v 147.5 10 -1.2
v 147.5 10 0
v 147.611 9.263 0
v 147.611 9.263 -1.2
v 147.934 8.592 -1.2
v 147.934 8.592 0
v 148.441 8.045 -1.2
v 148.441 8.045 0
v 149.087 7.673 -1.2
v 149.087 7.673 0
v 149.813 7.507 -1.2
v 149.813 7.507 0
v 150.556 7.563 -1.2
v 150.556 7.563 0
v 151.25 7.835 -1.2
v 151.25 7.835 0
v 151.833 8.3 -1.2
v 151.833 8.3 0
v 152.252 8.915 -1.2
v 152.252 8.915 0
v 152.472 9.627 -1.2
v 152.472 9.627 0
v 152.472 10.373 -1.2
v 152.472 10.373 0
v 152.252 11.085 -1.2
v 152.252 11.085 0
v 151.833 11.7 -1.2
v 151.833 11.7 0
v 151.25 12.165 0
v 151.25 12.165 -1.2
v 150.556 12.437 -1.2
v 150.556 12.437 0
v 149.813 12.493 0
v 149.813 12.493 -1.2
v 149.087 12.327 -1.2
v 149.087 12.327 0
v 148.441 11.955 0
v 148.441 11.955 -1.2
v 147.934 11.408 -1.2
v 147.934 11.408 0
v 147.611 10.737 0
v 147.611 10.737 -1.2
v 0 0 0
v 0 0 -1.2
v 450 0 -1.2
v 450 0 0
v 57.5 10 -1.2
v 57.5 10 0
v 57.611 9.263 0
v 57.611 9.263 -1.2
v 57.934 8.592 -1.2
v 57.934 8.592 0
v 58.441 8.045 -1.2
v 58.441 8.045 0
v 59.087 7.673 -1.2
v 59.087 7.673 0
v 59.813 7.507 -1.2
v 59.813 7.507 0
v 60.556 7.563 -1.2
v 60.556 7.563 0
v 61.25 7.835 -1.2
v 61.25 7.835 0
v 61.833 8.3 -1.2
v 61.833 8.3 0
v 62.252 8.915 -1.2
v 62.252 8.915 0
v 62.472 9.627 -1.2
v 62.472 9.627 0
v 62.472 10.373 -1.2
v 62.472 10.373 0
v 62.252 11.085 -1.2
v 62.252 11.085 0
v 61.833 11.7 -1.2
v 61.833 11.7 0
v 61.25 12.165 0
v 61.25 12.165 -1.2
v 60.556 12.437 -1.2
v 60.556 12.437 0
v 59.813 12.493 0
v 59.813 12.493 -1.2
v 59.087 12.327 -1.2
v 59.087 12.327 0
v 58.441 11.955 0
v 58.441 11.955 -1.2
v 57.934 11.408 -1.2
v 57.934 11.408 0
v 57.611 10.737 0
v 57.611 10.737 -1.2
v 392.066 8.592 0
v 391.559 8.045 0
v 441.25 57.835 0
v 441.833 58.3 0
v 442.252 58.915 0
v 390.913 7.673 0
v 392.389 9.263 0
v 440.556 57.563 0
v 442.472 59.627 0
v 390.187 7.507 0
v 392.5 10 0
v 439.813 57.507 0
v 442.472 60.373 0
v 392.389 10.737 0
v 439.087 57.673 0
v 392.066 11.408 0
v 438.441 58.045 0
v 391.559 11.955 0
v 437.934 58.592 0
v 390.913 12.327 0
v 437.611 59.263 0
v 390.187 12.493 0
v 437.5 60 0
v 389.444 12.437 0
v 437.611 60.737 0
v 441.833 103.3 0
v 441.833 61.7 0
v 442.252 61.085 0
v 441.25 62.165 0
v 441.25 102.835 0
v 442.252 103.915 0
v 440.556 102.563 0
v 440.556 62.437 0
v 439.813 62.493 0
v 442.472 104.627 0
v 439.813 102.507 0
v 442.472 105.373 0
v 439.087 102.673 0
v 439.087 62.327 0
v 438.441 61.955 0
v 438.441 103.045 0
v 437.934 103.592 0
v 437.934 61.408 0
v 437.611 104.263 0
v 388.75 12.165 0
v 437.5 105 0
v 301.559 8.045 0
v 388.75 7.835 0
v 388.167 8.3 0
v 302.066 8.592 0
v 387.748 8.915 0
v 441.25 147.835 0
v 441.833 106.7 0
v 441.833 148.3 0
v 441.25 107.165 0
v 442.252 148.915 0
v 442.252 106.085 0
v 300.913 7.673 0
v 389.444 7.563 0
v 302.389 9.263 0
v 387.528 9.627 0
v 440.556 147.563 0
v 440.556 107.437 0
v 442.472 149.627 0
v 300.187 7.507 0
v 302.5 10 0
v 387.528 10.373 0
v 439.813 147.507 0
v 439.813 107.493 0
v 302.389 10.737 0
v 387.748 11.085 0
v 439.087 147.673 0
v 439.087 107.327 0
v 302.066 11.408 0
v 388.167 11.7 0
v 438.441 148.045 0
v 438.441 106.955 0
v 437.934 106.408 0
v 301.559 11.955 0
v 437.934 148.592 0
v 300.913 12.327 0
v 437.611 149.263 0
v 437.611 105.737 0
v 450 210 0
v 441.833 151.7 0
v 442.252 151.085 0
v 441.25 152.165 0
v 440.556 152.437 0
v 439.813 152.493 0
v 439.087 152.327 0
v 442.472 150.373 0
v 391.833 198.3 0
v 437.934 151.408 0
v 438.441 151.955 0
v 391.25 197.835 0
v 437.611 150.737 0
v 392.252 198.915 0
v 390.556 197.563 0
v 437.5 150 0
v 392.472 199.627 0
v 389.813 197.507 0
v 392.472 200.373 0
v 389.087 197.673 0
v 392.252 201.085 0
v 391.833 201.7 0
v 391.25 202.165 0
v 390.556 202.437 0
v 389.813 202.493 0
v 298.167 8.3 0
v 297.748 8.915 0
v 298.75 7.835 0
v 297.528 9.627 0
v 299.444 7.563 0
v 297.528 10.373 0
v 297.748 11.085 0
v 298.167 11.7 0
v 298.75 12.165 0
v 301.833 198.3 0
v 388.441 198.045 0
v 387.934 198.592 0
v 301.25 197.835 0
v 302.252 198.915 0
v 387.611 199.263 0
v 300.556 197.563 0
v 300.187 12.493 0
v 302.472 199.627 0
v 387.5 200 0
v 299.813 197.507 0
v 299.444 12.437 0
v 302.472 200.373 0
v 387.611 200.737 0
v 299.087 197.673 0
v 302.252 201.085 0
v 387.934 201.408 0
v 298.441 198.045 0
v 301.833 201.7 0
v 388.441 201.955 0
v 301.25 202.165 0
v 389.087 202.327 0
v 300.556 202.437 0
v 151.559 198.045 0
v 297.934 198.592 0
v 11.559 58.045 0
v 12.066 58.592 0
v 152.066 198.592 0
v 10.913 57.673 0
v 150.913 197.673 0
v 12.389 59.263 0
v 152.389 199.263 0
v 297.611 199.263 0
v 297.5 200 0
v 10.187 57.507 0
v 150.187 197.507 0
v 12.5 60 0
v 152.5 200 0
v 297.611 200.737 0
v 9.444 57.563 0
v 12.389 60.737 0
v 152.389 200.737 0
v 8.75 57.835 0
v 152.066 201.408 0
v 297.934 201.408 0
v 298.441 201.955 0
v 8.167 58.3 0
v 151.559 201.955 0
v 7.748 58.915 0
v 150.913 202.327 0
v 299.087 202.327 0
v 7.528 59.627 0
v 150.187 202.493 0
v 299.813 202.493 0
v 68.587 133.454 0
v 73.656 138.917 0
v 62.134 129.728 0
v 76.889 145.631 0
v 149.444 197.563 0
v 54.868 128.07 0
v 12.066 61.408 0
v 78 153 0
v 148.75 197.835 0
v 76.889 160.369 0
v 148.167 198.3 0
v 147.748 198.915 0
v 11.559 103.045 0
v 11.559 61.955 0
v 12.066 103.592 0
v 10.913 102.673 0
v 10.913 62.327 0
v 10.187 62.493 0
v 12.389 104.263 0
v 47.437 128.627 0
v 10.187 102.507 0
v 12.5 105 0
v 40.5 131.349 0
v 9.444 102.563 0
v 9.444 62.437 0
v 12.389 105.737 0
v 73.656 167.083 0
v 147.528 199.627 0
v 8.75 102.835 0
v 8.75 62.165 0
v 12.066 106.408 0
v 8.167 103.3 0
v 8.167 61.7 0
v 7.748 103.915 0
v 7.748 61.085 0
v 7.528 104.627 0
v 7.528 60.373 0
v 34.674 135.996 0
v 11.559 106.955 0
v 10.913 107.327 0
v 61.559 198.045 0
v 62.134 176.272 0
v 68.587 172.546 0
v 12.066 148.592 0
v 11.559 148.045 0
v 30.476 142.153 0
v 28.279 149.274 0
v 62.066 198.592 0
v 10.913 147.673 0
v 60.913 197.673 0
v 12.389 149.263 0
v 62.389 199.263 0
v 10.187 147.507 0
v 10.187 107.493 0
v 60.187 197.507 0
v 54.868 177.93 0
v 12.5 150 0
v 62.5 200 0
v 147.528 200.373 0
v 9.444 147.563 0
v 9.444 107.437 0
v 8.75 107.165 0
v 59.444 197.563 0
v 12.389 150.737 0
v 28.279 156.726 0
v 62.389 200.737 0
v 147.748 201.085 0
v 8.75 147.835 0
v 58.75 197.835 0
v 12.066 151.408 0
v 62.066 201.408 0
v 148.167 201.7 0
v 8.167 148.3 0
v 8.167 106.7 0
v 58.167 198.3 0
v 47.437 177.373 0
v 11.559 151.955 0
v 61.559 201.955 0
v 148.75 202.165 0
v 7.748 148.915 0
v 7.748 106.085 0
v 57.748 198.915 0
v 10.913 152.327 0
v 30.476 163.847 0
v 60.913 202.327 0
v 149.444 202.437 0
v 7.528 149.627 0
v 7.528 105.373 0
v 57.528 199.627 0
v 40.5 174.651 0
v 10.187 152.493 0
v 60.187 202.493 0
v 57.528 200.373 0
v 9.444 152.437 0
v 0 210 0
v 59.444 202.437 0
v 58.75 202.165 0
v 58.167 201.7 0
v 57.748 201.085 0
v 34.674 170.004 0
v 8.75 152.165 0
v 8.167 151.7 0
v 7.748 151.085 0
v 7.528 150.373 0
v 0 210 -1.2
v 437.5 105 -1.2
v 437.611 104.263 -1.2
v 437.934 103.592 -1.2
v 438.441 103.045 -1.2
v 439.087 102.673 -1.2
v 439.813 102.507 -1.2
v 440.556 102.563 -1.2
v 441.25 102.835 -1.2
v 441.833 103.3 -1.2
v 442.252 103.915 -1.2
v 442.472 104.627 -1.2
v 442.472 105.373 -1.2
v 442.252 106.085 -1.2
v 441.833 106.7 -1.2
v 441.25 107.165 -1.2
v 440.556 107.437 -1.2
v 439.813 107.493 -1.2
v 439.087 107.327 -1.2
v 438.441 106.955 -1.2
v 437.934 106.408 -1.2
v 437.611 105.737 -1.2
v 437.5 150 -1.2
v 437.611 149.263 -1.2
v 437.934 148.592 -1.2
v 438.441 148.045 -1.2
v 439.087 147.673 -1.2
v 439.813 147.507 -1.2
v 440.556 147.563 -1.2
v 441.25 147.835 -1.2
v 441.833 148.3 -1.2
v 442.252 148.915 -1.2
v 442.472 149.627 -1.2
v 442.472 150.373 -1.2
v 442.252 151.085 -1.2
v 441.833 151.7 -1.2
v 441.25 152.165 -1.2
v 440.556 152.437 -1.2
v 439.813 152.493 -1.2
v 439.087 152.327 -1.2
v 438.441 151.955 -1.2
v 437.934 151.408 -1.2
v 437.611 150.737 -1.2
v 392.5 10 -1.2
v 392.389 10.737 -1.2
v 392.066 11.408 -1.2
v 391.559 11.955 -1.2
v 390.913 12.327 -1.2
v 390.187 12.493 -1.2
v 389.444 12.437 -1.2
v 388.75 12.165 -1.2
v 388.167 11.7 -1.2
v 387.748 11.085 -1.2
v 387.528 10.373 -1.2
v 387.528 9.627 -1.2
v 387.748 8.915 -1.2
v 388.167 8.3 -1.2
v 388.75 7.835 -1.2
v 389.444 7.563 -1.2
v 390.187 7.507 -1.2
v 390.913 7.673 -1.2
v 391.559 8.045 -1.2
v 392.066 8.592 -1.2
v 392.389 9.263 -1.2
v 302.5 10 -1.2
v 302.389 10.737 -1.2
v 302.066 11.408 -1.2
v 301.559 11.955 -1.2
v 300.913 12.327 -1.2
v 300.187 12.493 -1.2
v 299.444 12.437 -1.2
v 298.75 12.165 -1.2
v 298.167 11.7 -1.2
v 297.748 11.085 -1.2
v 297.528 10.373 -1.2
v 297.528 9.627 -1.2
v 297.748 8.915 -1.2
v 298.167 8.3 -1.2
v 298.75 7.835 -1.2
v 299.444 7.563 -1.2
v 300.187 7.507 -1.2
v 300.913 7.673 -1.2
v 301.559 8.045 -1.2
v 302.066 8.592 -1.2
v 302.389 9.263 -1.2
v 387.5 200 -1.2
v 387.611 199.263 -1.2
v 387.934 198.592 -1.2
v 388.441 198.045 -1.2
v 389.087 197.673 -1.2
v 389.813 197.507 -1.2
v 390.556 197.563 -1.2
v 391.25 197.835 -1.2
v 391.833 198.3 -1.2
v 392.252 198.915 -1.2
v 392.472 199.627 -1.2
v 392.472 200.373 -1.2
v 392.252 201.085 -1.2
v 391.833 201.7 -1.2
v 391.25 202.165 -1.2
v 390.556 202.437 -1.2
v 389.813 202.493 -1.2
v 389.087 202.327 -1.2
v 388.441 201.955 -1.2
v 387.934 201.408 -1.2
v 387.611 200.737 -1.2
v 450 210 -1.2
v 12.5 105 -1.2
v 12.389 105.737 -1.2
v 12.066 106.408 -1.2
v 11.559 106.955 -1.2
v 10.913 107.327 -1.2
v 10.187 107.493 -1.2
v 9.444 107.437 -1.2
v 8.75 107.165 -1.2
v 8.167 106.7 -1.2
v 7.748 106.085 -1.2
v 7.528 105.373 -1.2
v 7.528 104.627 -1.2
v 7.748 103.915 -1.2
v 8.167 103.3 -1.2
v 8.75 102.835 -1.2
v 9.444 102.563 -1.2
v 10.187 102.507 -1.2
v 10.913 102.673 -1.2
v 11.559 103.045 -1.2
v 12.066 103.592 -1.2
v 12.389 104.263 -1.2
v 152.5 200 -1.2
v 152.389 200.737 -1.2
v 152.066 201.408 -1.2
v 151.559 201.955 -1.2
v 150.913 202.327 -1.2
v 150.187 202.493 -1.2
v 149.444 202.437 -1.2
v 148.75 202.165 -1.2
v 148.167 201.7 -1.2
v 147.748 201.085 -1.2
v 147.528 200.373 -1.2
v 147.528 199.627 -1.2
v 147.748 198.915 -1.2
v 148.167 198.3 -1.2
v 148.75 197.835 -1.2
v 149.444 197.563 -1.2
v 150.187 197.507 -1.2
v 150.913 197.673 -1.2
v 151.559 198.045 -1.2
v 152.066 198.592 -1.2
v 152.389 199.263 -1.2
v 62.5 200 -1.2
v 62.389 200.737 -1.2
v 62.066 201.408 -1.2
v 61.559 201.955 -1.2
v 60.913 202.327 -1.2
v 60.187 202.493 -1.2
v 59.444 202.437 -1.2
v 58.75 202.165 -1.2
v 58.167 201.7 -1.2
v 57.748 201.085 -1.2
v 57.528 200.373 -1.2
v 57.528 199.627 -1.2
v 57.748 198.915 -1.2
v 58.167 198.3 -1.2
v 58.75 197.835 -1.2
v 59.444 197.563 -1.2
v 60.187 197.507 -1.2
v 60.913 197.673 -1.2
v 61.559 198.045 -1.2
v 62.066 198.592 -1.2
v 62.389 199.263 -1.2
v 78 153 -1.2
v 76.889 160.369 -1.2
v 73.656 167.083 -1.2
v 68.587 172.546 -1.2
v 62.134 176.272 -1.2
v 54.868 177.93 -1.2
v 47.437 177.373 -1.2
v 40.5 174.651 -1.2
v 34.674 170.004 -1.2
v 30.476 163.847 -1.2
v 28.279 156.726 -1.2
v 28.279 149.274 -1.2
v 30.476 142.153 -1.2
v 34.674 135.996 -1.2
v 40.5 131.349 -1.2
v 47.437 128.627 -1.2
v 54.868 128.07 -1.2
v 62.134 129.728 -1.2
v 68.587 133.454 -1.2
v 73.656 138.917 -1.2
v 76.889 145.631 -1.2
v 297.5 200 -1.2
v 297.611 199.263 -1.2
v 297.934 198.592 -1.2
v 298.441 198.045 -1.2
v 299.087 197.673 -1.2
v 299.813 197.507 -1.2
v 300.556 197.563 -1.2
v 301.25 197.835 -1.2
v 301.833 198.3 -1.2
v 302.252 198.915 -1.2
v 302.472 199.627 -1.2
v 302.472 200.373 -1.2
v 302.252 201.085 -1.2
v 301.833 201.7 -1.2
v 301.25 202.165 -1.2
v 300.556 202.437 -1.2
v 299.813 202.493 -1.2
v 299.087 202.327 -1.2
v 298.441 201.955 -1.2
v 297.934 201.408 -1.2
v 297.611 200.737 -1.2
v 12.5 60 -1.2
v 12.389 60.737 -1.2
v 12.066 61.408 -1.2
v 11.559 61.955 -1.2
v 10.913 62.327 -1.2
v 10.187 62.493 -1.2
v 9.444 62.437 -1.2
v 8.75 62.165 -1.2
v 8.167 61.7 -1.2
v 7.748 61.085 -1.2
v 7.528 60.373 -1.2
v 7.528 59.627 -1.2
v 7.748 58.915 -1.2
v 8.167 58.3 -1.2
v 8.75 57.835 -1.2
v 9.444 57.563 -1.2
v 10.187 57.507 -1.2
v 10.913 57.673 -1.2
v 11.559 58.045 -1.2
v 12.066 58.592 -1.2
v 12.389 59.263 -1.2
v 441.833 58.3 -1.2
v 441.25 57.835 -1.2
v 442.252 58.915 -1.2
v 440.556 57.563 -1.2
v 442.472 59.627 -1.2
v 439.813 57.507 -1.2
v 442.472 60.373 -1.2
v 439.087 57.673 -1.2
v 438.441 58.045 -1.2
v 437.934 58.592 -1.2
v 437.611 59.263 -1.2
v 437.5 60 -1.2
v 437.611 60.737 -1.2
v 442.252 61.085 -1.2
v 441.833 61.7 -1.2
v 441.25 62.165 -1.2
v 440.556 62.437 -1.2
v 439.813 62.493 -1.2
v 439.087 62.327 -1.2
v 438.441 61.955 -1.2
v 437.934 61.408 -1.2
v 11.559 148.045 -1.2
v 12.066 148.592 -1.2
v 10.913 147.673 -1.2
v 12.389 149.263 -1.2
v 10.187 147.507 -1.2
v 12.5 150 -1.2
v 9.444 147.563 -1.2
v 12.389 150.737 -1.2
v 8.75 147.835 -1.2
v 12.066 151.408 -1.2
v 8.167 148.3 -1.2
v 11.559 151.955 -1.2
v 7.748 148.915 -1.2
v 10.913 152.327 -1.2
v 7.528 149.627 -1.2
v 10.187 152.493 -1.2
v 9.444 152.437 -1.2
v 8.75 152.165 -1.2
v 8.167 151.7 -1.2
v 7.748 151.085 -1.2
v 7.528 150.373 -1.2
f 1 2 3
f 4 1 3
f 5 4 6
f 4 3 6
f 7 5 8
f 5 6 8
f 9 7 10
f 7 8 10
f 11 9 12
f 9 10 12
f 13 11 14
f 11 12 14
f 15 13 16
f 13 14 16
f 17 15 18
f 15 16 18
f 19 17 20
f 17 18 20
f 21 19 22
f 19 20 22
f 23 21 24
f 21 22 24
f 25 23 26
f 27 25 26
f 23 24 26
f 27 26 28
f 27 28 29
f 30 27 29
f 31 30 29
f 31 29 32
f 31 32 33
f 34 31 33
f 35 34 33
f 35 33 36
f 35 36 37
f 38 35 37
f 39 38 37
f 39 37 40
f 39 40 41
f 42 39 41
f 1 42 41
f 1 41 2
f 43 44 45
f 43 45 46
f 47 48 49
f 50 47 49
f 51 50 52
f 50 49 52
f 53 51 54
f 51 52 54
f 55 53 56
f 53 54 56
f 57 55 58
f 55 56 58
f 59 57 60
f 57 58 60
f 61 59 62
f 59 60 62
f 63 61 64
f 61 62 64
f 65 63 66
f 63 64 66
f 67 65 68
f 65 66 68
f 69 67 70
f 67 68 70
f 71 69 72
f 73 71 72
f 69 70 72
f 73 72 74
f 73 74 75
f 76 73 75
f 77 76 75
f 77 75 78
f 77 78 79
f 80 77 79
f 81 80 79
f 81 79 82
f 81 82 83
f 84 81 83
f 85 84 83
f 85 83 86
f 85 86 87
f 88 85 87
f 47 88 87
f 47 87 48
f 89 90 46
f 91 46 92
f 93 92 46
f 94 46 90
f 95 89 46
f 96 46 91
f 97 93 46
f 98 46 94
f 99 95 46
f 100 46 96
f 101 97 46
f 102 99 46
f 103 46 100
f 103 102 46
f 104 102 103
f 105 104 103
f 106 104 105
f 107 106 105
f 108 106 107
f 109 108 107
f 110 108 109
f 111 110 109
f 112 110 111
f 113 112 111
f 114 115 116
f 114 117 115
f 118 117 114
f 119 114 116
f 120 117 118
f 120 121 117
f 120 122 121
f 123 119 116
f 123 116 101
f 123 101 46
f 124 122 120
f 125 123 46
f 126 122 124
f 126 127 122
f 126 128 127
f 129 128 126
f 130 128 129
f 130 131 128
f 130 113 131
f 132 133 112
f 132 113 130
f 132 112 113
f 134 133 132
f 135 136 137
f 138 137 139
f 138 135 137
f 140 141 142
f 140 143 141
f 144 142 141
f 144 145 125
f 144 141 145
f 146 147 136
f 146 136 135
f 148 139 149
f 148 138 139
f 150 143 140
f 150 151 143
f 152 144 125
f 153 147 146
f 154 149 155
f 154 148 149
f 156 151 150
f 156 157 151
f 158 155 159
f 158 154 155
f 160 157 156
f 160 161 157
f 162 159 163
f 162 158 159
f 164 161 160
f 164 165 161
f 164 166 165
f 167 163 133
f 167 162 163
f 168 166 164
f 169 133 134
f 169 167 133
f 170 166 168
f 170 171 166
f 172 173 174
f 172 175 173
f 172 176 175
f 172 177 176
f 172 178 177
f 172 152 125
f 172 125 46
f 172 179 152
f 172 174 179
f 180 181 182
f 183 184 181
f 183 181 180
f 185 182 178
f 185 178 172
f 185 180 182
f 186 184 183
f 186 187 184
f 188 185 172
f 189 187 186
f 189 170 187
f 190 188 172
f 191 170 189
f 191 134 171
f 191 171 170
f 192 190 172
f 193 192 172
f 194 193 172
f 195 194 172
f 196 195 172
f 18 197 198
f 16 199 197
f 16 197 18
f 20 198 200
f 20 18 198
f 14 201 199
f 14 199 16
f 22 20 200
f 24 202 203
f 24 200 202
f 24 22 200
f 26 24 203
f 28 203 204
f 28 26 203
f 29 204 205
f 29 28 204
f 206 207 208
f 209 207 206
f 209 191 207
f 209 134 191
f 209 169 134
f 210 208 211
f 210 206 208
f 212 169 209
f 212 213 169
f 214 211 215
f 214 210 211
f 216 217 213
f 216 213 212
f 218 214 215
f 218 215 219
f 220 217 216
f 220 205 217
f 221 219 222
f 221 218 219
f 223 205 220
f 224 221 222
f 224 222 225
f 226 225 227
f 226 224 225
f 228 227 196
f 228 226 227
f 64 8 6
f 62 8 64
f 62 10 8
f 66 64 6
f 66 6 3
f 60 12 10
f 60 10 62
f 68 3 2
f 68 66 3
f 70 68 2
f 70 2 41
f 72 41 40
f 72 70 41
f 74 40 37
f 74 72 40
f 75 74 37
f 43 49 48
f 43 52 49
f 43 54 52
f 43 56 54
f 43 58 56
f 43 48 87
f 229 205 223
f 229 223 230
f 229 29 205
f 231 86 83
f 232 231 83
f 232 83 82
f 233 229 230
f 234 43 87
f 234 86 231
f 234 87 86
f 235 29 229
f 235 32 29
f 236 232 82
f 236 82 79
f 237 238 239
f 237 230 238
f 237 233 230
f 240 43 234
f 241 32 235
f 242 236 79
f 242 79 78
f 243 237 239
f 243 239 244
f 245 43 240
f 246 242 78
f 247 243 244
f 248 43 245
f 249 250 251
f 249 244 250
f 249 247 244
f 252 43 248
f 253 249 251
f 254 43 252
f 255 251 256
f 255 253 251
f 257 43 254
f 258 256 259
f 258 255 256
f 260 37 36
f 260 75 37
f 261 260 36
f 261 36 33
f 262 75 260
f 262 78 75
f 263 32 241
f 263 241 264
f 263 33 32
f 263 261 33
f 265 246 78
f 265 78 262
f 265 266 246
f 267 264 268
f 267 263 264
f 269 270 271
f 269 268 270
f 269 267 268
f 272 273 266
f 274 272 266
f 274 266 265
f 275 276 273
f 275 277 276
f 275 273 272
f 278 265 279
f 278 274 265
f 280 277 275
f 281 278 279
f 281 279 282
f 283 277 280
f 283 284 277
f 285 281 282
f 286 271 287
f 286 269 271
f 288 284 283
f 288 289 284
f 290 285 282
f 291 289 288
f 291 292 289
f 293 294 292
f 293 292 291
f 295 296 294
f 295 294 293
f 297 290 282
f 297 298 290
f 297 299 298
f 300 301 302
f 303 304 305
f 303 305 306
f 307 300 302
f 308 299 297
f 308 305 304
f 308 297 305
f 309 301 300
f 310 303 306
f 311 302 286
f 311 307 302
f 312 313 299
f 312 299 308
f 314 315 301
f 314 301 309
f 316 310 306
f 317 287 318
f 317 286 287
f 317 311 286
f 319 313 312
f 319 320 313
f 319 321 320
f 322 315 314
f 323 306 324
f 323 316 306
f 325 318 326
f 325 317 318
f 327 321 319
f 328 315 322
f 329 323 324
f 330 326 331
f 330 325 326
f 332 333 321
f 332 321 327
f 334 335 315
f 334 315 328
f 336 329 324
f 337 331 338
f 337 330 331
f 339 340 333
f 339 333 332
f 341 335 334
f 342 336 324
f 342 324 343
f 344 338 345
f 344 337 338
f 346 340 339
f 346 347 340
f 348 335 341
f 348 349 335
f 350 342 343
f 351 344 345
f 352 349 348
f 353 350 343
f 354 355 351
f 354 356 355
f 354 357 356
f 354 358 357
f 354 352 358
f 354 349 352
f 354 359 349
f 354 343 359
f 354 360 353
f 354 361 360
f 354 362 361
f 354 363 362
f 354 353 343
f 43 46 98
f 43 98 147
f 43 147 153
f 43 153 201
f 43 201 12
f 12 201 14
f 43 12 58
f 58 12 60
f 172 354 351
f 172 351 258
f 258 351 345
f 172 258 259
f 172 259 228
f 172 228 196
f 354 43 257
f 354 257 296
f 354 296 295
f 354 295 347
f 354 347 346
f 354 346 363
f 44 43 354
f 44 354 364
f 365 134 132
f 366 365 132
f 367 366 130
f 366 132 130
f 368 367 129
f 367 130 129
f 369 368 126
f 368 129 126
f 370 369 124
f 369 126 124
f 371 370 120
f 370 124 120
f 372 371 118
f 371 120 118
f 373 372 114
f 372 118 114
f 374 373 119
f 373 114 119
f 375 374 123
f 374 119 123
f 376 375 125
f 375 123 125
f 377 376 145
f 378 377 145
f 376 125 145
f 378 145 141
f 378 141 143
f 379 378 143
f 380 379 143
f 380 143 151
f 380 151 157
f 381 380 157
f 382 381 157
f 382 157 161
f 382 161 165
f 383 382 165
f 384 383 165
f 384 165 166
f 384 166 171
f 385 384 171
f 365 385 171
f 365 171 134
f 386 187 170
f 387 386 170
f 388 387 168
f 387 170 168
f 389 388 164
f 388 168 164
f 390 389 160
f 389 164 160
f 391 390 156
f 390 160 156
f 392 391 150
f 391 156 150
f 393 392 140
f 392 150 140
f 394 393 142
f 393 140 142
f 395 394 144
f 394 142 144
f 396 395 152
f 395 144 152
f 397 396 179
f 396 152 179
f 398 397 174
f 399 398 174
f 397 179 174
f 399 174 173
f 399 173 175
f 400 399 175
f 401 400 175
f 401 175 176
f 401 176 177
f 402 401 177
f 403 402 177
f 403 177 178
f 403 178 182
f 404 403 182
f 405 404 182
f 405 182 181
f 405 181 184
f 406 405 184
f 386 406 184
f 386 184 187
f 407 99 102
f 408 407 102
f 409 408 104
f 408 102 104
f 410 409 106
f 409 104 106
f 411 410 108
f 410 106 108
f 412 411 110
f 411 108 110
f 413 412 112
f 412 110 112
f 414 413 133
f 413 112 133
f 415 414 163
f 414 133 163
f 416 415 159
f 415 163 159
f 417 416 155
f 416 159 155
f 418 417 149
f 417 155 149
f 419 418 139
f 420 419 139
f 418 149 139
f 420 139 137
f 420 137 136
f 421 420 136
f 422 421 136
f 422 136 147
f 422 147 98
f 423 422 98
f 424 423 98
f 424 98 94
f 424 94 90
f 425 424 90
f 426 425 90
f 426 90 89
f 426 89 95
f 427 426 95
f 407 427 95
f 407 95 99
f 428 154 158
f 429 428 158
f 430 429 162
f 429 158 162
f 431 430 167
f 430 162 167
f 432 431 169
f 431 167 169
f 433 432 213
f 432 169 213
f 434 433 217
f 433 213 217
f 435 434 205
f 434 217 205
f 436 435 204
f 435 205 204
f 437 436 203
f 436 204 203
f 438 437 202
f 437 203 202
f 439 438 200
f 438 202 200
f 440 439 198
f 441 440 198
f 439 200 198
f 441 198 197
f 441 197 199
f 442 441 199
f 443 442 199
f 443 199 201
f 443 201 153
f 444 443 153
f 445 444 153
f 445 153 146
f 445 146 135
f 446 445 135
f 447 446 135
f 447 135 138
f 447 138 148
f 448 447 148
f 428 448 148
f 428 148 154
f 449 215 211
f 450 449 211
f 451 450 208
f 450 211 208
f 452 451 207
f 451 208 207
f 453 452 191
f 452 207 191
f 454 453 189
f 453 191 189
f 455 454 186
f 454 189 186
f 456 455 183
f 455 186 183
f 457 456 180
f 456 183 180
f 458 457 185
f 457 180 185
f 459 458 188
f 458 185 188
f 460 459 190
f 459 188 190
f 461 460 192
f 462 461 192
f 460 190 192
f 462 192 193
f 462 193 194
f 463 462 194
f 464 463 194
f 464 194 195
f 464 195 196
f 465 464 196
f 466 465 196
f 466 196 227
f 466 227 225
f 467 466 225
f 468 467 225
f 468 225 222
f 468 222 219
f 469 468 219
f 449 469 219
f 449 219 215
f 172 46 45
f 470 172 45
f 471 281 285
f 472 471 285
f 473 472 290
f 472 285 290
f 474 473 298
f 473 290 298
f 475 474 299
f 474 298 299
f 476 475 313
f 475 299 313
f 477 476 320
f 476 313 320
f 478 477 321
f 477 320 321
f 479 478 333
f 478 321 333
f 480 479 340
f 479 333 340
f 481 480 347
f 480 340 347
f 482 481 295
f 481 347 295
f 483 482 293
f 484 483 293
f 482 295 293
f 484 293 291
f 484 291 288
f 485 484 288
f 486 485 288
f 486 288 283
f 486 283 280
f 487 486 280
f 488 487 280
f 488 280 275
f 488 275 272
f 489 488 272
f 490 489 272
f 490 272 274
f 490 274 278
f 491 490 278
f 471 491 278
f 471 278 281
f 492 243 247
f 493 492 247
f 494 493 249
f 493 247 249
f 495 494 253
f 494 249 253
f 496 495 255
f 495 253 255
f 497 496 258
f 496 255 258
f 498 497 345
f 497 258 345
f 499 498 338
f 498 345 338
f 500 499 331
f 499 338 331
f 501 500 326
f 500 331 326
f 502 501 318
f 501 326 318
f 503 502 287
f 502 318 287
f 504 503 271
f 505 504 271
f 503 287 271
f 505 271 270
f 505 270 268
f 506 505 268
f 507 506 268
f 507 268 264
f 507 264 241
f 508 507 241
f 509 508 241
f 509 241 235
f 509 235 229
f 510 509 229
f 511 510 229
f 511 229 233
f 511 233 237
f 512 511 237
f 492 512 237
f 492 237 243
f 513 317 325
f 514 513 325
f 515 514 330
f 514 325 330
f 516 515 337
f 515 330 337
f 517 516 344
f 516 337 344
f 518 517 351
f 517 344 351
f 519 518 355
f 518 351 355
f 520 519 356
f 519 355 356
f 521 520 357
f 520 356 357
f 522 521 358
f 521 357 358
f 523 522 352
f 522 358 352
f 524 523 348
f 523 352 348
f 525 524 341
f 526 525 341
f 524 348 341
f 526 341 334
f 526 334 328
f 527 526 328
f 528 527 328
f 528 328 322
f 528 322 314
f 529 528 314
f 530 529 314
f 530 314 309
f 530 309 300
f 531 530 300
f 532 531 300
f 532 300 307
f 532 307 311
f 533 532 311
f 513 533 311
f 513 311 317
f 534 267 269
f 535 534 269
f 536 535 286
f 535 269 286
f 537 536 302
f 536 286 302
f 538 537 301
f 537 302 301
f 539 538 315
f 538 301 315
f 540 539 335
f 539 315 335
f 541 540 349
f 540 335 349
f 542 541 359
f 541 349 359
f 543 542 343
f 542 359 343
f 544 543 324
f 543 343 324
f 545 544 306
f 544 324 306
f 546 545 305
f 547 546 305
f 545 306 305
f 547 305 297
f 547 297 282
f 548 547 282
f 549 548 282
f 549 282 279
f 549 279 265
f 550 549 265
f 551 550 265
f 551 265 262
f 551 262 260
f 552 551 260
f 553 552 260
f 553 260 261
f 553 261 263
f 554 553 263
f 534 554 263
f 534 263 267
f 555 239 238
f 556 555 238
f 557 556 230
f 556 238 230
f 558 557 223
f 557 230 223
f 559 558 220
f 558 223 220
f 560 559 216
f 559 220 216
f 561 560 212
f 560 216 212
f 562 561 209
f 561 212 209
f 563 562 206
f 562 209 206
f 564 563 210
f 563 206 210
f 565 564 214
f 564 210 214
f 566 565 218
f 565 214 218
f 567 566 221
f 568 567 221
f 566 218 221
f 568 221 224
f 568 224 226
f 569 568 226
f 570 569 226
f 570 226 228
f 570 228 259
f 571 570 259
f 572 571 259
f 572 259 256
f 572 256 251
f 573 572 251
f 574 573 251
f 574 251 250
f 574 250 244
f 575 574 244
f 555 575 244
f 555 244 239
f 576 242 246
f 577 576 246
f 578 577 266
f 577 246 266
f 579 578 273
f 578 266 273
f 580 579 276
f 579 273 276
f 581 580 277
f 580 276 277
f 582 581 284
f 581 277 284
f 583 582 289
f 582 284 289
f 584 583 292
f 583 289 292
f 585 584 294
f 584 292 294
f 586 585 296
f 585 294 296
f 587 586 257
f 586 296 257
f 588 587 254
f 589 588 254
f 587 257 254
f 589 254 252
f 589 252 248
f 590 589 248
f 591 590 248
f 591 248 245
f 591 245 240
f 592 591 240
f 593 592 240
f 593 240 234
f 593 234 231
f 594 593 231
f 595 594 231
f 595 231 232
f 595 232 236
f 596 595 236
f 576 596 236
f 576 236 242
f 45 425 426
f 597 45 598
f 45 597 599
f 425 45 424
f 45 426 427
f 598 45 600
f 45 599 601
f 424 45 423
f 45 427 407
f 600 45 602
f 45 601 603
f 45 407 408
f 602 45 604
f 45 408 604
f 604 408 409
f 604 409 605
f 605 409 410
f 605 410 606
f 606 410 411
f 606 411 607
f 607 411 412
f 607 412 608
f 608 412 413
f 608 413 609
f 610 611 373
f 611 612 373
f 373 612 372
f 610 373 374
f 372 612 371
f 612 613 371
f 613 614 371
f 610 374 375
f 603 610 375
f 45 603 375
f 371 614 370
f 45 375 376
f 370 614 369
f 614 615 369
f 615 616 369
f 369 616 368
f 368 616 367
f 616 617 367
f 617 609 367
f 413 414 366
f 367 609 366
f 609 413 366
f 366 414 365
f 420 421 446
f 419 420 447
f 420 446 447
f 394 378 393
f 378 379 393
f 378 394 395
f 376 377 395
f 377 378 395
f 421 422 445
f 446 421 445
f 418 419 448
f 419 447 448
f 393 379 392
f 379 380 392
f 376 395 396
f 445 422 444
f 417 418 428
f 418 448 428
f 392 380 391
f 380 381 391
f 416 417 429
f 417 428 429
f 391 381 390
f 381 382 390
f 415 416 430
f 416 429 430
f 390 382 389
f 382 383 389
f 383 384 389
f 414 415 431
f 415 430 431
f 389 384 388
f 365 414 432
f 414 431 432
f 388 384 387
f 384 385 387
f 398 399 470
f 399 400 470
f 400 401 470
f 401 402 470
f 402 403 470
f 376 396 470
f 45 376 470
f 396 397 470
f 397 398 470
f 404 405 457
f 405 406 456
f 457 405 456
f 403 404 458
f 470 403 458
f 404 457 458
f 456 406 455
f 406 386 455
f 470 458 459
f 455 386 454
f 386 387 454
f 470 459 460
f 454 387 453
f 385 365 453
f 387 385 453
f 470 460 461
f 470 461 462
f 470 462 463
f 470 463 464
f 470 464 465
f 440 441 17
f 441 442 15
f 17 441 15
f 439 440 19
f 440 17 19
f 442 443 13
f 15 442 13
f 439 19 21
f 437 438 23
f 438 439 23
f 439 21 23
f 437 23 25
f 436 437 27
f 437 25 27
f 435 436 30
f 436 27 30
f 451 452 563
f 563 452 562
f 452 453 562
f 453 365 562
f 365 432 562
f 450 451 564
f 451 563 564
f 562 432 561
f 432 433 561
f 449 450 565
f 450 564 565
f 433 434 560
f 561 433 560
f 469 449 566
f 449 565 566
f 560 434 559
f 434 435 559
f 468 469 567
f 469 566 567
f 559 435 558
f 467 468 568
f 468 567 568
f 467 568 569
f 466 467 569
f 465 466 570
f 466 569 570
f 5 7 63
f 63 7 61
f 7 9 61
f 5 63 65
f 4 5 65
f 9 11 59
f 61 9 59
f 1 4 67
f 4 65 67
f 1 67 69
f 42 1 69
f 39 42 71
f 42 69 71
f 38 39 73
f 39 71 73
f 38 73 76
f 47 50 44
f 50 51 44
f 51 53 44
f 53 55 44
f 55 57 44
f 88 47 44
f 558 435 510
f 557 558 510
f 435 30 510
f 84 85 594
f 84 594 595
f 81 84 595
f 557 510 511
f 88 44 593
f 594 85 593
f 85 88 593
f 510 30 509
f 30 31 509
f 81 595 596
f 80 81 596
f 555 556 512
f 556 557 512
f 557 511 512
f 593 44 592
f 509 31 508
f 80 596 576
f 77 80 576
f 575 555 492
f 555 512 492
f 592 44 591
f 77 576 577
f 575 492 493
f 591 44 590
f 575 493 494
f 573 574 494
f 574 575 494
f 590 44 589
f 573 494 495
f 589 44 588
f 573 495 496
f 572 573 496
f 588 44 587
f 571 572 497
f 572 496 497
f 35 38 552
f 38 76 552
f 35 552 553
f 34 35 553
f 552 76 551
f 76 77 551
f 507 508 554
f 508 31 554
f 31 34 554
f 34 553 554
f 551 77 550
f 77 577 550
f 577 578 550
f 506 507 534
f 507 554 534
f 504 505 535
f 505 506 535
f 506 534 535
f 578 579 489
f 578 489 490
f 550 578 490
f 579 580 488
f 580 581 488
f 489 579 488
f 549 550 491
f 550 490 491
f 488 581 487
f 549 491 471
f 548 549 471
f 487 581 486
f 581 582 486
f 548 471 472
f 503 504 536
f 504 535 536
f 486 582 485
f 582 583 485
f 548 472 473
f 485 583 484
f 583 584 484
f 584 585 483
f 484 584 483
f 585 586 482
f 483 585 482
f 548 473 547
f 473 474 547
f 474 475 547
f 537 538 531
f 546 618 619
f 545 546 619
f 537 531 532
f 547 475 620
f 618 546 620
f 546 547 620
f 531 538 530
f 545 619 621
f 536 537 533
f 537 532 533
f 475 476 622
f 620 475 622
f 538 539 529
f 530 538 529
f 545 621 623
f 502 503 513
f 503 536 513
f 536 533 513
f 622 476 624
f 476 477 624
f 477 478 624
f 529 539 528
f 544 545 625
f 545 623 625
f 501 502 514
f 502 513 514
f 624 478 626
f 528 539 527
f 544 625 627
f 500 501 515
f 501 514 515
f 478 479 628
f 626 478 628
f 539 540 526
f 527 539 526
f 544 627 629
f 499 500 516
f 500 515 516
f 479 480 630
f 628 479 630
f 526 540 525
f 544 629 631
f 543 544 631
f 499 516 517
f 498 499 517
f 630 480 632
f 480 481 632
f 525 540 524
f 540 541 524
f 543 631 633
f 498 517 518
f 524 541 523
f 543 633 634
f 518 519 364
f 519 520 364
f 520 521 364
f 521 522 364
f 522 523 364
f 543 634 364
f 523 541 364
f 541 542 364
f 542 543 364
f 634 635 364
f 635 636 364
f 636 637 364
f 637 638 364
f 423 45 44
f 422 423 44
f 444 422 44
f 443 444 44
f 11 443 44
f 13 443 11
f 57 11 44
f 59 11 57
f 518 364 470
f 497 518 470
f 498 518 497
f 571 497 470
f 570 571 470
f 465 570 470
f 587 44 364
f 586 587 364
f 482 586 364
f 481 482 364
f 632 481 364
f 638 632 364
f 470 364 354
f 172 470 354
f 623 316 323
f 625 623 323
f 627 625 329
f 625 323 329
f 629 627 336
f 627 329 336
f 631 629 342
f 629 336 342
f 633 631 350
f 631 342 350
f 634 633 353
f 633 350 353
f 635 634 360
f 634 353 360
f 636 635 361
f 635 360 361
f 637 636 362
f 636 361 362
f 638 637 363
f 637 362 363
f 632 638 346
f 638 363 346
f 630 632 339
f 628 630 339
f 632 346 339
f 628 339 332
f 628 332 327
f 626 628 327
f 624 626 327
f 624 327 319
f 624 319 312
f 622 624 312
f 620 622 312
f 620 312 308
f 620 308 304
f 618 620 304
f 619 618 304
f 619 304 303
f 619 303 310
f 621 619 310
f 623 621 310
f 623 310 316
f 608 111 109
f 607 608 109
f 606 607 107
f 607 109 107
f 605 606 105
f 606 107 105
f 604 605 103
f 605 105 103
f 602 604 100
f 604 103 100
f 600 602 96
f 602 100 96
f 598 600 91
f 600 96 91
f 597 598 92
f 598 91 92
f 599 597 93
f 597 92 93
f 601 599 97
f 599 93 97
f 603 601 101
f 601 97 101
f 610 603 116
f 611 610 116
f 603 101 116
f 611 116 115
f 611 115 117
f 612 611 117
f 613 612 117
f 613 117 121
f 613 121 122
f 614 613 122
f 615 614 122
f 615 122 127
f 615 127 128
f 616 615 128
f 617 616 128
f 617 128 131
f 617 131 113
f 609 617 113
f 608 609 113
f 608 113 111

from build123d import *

# Parameters (mm, degrees)
SURFACE_EXTRUDE1_1_DEPTH = 450
THICKEN15_T2             = 1.2
SKETCH2_R                = 25
CUT_EXTRUDE1_DEPTH       = 10
SKETCH3_R                = 2.5
CUT_EXTRUDE2_DEPTH       = 10


with BuildPart() as body_1:
    # Surface-Extrude1: a surface, the sketch's curves swept straight by 450 mm
    with BuildLine(Plane(origin=(0, 0, 0), x_dir=(0, 0, -1), z_dir=(1, 0, 0)), mode=Mode.PRIVATE) as surface_extrude1_1_path:
        Line((0, 0), (0, 210))
    surface_extrude1_1 = Shell.extrude(surface_extrude1_1_path.wire(), (1 * SURFACE_EXTRUDE1_1_DEPTH, 0 * SURFACE_EXTRUDE1_1_DEPTH, 0 * SURFACE_EXTRUDE1_1_DEPTH))
    add(Solid.thicken(surface_extrude1_1, -THICKEN15_T2))

    # Sketch2 → Cut-Extrude1 (cut)
    with BuildSketch(Plane.XY):
        with Locations((53, 153)):
            Circle(SKETCH2_R)
    extrude(amount=-CUT_EXTRUDE1_DEPTH, mode=Mode.SUBTRACT)

    # Sketch3 → Cut-Extrude2 (cut)
    with BuildSketch(Plane.XY):
        with Locations((10, 60)):
            Circle(SKETCH3_R)
        with Locations((10, 105)):
            Circle(SKETCH3_R)
        with Locations((10, 150)):
            Circle(SKETCH3_R)
        with Locations(Location((440, 60, 0), (0, 0, 180))):
            Circle(SKETCH3_R)
        with Locations(Location((440, 105, 0), (0, 0, 180))):
            Circle(SKETCH3_R)
        with Locations(Location((440, 150, 0), (0, 0, 180))):
            Circle(SKETCH3_R)
        with Locations((60, 200)):
            Circle(SKETCH3_R)
        with Locations((150, 200)):
            Circle(SKETCH3_R)
        with Locations(Location((300, 200, 0), (0, 0, 180))):
            Circle(SKETCH3_R)
        with Locations(Location((390, 200, 0), (0, 0, 180))):
            Circle(SKETCH3_R)
        with Locations((390, 10)):
            Circle(SKETCH3_R)
        with Locations((300, 10)):
            Circle(SKETCH3_R)
        with Locations(Location((150, 10, 0), (0, 0, 180))):
            Circle(SKETCH3_R)
        with Locations(Location((60, 10, 0), (0, 0, 180))):
            Circle(SKETCH3_R)
    extrude(amount=-CUT_EXTRUDE2_DEPTH, mode=Mode.SUBTRACT)


solid = body_1.part
